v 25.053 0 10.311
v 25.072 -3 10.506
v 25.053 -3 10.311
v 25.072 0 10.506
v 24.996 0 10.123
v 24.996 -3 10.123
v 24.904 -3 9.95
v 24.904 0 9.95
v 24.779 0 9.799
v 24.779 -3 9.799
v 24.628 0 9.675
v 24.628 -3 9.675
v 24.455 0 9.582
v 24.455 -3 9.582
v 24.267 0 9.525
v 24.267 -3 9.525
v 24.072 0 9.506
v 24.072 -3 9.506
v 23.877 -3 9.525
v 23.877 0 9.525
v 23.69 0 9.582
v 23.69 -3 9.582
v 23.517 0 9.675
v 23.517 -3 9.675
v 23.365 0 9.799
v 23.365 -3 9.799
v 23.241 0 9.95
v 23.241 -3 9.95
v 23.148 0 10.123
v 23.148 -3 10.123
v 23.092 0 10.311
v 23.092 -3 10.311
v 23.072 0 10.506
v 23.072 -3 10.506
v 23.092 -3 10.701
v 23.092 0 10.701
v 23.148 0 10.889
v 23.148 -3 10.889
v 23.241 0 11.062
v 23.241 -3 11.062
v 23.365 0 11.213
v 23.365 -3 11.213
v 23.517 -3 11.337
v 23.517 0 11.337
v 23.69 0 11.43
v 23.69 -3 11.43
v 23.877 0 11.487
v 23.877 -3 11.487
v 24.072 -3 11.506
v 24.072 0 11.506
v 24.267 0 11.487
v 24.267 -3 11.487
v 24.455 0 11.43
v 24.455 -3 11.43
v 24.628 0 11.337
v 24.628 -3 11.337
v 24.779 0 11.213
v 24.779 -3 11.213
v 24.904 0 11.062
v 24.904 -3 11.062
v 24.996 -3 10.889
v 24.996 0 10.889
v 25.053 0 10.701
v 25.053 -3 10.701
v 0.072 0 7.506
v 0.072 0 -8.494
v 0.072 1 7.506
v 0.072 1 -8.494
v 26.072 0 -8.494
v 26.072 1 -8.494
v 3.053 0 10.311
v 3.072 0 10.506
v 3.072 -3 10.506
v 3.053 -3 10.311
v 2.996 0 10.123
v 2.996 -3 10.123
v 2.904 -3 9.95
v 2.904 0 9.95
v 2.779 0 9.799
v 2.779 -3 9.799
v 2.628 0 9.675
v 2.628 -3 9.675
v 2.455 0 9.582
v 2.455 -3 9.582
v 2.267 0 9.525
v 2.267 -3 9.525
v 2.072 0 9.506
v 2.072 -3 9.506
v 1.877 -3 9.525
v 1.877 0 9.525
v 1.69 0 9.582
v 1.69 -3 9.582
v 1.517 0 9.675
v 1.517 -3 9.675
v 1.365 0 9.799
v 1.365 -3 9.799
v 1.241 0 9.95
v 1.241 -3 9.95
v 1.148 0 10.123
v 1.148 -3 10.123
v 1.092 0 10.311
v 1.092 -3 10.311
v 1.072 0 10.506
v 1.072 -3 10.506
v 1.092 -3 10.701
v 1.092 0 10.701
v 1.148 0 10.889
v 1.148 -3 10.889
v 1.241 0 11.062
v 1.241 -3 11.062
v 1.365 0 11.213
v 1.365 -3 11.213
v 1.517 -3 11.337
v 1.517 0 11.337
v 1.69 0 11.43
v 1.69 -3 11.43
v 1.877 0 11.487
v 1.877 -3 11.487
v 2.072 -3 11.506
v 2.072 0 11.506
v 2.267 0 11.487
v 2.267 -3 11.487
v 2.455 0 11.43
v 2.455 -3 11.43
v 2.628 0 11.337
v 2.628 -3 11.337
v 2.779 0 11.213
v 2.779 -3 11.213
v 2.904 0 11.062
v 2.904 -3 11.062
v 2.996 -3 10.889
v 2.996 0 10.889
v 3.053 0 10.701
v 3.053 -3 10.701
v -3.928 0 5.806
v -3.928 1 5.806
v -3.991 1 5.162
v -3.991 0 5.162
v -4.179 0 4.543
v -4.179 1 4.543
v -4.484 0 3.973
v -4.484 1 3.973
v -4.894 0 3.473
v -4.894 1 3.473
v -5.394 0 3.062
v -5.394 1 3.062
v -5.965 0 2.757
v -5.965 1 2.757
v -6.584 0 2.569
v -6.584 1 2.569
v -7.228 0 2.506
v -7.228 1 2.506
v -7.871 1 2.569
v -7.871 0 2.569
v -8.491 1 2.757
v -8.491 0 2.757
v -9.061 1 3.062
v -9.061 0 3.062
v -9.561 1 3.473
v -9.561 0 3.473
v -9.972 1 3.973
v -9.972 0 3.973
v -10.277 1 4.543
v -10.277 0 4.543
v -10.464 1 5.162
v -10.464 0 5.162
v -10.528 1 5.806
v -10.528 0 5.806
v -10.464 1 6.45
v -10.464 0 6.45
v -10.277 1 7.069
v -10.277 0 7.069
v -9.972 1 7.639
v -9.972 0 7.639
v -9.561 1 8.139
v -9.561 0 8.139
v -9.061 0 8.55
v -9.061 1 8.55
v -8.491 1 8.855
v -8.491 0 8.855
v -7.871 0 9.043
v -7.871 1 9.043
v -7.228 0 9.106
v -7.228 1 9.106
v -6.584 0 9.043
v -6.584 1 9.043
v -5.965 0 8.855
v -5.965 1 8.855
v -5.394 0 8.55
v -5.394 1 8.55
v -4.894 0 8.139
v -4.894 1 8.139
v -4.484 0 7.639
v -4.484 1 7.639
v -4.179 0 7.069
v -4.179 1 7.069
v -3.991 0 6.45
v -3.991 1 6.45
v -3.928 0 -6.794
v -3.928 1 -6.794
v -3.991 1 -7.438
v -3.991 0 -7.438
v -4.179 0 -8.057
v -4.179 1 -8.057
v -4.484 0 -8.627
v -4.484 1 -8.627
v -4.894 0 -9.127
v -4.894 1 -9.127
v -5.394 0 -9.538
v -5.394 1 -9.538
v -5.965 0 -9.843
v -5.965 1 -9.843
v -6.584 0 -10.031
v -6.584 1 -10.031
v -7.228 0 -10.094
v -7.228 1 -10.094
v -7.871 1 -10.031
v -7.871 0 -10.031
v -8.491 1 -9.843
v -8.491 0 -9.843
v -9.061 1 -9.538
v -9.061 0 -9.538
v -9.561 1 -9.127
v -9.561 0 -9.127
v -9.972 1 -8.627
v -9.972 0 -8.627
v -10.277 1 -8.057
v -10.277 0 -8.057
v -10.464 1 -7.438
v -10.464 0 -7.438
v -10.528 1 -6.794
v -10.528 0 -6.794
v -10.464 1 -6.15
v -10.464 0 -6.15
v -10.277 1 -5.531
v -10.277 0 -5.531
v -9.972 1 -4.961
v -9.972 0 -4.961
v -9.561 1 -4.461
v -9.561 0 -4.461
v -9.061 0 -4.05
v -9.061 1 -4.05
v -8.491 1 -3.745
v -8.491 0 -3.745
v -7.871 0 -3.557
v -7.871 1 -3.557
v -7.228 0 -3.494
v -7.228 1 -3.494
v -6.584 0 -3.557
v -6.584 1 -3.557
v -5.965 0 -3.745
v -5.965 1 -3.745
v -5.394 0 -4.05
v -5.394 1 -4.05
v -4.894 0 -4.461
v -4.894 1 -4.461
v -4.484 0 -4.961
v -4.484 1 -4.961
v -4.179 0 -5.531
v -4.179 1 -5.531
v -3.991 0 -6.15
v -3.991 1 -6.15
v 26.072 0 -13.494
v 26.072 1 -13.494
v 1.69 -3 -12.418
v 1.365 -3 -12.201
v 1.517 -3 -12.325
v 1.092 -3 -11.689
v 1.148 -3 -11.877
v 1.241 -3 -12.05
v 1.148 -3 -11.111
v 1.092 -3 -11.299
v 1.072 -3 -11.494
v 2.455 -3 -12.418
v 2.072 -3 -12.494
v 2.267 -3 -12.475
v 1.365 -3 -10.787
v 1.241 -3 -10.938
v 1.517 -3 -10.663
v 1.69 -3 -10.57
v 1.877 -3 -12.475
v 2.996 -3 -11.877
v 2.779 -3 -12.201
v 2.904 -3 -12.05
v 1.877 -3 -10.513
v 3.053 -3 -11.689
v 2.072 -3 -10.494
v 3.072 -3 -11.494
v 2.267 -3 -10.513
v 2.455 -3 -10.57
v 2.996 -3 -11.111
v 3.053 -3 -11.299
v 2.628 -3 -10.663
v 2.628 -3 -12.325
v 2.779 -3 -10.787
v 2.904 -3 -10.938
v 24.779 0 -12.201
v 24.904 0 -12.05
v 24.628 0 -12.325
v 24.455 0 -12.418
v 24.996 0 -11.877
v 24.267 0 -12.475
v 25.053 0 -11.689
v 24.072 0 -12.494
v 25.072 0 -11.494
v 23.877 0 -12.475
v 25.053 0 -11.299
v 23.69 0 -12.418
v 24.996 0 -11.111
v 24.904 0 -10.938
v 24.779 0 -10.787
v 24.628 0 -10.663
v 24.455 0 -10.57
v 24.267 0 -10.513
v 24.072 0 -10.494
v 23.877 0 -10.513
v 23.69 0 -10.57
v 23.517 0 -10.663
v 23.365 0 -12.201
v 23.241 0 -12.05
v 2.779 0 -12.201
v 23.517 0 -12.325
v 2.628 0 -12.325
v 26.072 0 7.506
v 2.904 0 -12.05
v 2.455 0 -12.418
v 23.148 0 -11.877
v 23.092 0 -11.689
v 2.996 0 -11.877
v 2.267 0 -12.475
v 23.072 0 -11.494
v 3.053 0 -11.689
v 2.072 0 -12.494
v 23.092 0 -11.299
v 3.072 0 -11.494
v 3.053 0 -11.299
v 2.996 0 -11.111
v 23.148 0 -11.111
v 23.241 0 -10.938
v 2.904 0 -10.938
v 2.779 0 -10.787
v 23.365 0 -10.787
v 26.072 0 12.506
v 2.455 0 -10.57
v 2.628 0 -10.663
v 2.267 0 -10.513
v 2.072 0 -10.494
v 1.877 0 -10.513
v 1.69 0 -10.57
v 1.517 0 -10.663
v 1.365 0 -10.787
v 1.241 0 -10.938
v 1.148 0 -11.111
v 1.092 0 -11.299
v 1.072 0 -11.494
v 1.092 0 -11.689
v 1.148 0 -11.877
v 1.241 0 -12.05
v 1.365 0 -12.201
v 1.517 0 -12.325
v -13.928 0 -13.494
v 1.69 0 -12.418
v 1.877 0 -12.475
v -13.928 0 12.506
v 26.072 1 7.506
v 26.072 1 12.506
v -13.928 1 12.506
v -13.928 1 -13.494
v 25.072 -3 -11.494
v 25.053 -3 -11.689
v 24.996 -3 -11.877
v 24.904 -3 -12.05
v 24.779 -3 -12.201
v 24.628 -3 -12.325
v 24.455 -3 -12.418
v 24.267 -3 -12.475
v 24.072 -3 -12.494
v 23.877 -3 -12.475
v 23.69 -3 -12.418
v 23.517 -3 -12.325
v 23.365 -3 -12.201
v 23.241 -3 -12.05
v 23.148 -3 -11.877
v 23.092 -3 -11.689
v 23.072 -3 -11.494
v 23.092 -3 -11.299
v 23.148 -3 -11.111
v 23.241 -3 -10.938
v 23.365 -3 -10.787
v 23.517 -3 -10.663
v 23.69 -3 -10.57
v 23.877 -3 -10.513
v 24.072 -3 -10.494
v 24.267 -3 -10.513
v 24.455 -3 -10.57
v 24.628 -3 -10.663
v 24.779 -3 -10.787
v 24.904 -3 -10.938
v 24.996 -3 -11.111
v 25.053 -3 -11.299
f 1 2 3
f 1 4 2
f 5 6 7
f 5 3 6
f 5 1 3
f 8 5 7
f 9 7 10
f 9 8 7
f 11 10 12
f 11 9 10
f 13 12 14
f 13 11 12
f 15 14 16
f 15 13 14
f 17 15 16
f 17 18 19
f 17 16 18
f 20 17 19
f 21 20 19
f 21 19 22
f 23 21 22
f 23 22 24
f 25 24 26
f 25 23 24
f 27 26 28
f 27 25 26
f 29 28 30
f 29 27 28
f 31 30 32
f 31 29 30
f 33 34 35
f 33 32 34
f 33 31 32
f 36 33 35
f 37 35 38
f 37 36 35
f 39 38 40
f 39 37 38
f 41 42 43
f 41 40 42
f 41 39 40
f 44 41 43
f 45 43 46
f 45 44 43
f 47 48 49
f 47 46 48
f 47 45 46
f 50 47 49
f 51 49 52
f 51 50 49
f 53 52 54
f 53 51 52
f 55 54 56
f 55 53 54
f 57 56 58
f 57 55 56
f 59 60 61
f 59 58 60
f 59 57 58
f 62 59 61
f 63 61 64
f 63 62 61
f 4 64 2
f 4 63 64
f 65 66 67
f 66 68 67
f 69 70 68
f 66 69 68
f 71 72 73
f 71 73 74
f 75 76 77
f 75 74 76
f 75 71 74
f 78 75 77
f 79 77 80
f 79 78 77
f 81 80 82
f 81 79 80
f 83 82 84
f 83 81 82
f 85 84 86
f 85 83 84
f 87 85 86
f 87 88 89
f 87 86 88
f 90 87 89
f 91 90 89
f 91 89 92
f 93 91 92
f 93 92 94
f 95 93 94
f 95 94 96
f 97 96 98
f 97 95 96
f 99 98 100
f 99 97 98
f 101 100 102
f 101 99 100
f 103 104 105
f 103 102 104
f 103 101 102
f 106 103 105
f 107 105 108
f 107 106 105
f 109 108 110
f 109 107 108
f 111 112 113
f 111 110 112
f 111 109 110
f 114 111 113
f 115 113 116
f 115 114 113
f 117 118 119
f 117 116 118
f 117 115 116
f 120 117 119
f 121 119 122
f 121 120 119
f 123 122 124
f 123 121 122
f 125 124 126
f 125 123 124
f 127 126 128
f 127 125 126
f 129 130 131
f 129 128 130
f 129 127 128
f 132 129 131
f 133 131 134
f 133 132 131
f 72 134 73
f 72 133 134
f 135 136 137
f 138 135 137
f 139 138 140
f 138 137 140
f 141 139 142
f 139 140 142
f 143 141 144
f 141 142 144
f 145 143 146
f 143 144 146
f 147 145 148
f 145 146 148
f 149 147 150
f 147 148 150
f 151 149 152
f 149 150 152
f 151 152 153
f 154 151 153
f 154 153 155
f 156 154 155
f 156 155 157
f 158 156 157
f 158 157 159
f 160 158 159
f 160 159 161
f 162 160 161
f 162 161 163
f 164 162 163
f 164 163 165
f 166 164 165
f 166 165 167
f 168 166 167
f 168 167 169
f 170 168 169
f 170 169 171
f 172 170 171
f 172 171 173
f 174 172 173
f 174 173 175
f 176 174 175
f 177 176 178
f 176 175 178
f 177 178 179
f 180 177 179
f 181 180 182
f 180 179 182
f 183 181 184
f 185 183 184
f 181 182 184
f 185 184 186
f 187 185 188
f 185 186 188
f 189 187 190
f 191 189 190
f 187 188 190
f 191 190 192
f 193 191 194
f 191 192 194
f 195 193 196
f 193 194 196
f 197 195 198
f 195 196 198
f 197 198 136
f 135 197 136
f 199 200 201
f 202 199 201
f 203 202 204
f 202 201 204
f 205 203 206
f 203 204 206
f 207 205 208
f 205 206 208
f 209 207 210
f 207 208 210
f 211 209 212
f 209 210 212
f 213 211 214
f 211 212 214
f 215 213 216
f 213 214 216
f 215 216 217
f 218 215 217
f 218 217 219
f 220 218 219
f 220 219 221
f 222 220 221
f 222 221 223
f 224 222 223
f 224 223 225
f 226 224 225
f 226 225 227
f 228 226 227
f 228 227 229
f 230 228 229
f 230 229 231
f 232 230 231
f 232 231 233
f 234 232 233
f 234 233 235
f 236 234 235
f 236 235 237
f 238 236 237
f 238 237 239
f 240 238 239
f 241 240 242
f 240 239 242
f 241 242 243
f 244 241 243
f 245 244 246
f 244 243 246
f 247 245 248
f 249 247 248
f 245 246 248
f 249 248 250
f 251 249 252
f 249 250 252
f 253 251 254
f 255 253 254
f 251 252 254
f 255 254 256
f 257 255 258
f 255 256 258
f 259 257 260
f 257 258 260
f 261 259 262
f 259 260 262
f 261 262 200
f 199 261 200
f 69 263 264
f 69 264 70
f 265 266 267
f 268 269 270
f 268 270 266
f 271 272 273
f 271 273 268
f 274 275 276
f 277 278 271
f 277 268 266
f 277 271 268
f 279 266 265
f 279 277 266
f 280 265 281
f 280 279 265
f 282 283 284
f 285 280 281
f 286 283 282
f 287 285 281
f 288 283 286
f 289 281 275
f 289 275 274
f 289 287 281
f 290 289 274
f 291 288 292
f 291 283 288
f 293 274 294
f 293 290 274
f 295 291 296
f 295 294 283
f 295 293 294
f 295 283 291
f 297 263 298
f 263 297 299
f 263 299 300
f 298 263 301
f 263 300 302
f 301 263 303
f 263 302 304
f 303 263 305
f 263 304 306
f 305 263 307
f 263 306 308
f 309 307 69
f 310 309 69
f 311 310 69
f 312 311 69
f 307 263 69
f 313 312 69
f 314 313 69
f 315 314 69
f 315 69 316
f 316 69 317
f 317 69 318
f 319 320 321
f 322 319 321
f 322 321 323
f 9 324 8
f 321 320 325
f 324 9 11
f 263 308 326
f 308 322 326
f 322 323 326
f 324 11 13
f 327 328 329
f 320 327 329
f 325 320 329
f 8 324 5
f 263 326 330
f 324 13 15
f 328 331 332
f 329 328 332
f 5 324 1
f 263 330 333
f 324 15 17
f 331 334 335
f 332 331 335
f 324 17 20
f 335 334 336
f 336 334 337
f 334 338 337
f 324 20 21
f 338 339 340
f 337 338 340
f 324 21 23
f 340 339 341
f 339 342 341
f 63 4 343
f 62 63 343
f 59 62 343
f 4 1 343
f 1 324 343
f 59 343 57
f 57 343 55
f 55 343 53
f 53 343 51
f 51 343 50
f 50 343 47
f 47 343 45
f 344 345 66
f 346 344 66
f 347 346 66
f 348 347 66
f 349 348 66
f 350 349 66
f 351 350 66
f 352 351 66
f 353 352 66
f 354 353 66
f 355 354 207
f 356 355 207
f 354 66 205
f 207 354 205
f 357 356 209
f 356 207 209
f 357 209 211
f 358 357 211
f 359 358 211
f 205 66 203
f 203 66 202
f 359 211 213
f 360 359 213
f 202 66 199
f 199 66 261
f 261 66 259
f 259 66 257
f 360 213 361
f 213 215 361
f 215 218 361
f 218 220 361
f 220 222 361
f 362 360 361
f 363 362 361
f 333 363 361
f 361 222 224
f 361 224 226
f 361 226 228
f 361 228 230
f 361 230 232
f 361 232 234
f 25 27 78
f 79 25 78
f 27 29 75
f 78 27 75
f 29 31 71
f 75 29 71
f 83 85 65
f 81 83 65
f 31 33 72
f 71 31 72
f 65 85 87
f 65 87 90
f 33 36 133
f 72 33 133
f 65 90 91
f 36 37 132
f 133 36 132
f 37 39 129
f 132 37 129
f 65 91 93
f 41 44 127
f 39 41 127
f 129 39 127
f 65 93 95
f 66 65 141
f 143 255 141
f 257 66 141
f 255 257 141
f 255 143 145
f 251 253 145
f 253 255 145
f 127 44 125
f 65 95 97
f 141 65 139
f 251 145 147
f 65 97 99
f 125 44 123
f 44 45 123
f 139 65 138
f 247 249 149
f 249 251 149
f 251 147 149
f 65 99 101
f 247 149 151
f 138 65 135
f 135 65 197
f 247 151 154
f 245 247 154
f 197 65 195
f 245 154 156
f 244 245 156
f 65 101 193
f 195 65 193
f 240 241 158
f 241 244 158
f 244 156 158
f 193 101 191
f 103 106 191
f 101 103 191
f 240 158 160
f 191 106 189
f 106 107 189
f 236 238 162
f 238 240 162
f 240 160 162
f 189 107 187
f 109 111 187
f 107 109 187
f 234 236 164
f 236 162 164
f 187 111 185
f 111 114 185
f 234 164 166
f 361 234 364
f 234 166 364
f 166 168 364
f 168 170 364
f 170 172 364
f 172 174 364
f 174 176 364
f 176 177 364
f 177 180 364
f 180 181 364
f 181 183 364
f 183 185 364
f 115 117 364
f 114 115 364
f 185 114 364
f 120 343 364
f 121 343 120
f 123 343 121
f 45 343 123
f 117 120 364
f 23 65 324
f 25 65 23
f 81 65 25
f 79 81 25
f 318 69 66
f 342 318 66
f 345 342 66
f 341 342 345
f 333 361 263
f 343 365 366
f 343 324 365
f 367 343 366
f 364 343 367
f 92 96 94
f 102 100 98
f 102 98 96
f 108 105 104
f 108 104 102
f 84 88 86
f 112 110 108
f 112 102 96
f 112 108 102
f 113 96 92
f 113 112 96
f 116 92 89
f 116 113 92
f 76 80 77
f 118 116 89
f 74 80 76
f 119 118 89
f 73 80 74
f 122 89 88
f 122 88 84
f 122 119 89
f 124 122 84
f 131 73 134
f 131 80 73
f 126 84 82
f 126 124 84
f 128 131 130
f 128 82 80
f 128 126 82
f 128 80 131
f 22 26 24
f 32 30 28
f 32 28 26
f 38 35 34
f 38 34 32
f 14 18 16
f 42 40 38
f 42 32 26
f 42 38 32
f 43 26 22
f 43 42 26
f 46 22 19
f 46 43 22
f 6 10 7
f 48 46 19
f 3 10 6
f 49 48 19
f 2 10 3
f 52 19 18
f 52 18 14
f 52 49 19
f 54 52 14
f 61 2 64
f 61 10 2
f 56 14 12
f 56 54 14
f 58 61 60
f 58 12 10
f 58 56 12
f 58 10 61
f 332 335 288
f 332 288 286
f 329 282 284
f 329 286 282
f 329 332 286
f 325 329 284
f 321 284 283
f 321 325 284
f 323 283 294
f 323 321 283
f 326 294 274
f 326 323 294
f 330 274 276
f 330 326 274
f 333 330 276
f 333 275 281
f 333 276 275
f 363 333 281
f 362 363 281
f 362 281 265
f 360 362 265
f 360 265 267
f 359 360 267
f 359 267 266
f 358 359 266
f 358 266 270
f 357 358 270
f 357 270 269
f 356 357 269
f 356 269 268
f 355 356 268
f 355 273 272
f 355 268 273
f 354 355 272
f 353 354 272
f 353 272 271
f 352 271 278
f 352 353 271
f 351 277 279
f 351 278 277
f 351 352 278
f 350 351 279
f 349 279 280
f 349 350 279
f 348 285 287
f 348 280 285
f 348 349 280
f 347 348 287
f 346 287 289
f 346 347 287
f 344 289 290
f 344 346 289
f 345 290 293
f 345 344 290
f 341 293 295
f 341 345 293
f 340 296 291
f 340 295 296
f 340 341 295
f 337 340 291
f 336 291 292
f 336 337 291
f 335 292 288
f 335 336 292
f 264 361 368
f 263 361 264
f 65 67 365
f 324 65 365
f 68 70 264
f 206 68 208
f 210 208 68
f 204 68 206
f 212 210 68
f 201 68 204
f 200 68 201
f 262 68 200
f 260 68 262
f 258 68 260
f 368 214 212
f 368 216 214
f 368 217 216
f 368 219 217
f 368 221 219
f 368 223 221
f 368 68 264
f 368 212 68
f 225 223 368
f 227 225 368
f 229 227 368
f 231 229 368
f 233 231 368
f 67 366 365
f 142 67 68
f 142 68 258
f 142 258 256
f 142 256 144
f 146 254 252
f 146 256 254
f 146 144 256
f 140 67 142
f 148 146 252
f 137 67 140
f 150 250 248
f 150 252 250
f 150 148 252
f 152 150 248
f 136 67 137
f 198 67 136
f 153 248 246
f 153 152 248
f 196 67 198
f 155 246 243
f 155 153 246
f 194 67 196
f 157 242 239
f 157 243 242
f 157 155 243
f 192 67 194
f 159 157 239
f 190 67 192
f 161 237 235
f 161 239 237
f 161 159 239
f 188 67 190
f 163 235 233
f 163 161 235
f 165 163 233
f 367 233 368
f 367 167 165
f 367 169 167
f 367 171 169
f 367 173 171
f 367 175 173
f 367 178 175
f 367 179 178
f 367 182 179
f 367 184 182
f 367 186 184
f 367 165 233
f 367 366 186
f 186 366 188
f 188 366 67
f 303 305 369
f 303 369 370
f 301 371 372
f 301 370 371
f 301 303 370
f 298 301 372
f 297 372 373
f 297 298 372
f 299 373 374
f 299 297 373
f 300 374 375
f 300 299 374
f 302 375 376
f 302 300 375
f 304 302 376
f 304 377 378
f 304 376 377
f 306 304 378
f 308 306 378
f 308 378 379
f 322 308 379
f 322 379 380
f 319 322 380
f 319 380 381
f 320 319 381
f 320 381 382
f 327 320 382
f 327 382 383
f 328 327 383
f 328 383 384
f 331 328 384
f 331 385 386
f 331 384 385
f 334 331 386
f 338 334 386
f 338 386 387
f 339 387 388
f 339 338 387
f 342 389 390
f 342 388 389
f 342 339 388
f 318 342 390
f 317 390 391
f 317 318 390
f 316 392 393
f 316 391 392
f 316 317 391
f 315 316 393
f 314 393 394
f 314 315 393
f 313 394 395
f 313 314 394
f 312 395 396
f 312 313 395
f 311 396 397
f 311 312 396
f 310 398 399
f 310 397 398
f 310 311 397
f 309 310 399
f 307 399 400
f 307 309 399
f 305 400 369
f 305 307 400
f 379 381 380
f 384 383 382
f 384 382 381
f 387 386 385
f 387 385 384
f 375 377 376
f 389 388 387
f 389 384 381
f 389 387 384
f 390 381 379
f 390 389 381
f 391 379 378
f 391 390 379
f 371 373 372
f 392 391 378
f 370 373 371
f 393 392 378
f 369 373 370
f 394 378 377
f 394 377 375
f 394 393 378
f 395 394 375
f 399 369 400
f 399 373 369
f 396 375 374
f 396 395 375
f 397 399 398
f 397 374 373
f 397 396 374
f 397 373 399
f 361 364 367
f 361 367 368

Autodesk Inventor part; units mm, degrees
ref_plane "YZ Plane" through (0, 0, 0) normal (1, 0, 0) x (0, 1, 0)
ref_plane "XZ Plane" through (0, 0, 0) normal (0, 1, 0) x (-1, 0, 0)
ref_plane "XY Plane" through (0, 0, 0) normal (0, 0, 1) x (1, 0, 0)
sketch "Sketch1" plane through (0, 0, 0) normal (0, 1, 0) x (-1, 0, 0)
  line L0 (13.9277, -13.494) -> (-26.0723, -13.494)
  line L1 (-26.0723, -13.494) -> (-26.0723, 12.506)
  line L2 (-26.0723, 12.506) -> (13.9277, 12.506)
  line L3 (13.9277, 12.506) -> (13.9277, -13.494)
  point P0 (0, 0)
  dimension "d0" = 40
  dimension "d1" = 26
extrude "Extrusion1" add sketch "Sketch1" along normal blind 1
sketch "Sketch2" plane through (0, 0, 0) normal (0, -1, 0) x (1, 0, 0)
  circle A0 centre (24.0723, -11.494) radius 1
  line L0 (26.0723, -13.494) -> (-13.9277, -13.494) projected
  line L1 (26.0723, 12.506) -> (26.0723, -13.494) projected
  point P0 (0, 0)
  dimension "d4" = 2
  dimension "d5" = 2
  dimension "d6" = 2
extrude "Extrusion2" add sketch "Sketch2" along normal blind 3
pattern_linear "Rectangular Pattern1" count 2 spacing 22 along (-1, 0, 0) count 2 spacing 22 along (0, 0, 1) of "Extrusion2"
sketch "Sketch3" plane through (0, 1, 0) normal (0, 1, 0) x (1, 0, 0)
  line L0 (26.0723, -12.506) -> (26.0723, 13.494) projected
  line L1 (26.0723, 8.494) -> (0.0723, 8.494)
  line L2 (0.0723, 8.494) -> (0.0723, -7.506)
  line L3 (0.0723, -7.506) -> (26.0723, -7.506)
  line L4 (26.0723, -7.506) -> (26.0723, 8.494)
  line L5 (26.0723, 13.494) -> (-13.9277, 13.494) projected
  line L6 (-13.9277, -12.506) -> (26.0723, -12.506) projected
  circle A0 centre (-7.2277, 6.794) radius 3.3
  circle A1 centre (-7.2277, -5.806) radius 3.3
  line L7 (-13.9277, 13.494) -> (-13.9277, -12.506) projected
  point P0 (0, 0)
  dimension "d15" = 26
  dimension "d16" = 5
  dimension "d17" = 5
  dimension "d18" = 6.6
  dimension "d19" = 6.6
  dimension "d24" = 6.7
  dimension "d25" = 6.7
  dimension "d26" = 6.7
  dimension "d27" = 6.7
extrude "Extrusion3" cut sketch "Sketch3" against normal through all contours L3 L2 L1 L0 | A0 | A1
equation "\"d19\" = d18"
equation "\"d25\" = d24"
equation "\"d26\" = d25"
equation "\"d27\" = d24"
properties part number "dust_cover"
